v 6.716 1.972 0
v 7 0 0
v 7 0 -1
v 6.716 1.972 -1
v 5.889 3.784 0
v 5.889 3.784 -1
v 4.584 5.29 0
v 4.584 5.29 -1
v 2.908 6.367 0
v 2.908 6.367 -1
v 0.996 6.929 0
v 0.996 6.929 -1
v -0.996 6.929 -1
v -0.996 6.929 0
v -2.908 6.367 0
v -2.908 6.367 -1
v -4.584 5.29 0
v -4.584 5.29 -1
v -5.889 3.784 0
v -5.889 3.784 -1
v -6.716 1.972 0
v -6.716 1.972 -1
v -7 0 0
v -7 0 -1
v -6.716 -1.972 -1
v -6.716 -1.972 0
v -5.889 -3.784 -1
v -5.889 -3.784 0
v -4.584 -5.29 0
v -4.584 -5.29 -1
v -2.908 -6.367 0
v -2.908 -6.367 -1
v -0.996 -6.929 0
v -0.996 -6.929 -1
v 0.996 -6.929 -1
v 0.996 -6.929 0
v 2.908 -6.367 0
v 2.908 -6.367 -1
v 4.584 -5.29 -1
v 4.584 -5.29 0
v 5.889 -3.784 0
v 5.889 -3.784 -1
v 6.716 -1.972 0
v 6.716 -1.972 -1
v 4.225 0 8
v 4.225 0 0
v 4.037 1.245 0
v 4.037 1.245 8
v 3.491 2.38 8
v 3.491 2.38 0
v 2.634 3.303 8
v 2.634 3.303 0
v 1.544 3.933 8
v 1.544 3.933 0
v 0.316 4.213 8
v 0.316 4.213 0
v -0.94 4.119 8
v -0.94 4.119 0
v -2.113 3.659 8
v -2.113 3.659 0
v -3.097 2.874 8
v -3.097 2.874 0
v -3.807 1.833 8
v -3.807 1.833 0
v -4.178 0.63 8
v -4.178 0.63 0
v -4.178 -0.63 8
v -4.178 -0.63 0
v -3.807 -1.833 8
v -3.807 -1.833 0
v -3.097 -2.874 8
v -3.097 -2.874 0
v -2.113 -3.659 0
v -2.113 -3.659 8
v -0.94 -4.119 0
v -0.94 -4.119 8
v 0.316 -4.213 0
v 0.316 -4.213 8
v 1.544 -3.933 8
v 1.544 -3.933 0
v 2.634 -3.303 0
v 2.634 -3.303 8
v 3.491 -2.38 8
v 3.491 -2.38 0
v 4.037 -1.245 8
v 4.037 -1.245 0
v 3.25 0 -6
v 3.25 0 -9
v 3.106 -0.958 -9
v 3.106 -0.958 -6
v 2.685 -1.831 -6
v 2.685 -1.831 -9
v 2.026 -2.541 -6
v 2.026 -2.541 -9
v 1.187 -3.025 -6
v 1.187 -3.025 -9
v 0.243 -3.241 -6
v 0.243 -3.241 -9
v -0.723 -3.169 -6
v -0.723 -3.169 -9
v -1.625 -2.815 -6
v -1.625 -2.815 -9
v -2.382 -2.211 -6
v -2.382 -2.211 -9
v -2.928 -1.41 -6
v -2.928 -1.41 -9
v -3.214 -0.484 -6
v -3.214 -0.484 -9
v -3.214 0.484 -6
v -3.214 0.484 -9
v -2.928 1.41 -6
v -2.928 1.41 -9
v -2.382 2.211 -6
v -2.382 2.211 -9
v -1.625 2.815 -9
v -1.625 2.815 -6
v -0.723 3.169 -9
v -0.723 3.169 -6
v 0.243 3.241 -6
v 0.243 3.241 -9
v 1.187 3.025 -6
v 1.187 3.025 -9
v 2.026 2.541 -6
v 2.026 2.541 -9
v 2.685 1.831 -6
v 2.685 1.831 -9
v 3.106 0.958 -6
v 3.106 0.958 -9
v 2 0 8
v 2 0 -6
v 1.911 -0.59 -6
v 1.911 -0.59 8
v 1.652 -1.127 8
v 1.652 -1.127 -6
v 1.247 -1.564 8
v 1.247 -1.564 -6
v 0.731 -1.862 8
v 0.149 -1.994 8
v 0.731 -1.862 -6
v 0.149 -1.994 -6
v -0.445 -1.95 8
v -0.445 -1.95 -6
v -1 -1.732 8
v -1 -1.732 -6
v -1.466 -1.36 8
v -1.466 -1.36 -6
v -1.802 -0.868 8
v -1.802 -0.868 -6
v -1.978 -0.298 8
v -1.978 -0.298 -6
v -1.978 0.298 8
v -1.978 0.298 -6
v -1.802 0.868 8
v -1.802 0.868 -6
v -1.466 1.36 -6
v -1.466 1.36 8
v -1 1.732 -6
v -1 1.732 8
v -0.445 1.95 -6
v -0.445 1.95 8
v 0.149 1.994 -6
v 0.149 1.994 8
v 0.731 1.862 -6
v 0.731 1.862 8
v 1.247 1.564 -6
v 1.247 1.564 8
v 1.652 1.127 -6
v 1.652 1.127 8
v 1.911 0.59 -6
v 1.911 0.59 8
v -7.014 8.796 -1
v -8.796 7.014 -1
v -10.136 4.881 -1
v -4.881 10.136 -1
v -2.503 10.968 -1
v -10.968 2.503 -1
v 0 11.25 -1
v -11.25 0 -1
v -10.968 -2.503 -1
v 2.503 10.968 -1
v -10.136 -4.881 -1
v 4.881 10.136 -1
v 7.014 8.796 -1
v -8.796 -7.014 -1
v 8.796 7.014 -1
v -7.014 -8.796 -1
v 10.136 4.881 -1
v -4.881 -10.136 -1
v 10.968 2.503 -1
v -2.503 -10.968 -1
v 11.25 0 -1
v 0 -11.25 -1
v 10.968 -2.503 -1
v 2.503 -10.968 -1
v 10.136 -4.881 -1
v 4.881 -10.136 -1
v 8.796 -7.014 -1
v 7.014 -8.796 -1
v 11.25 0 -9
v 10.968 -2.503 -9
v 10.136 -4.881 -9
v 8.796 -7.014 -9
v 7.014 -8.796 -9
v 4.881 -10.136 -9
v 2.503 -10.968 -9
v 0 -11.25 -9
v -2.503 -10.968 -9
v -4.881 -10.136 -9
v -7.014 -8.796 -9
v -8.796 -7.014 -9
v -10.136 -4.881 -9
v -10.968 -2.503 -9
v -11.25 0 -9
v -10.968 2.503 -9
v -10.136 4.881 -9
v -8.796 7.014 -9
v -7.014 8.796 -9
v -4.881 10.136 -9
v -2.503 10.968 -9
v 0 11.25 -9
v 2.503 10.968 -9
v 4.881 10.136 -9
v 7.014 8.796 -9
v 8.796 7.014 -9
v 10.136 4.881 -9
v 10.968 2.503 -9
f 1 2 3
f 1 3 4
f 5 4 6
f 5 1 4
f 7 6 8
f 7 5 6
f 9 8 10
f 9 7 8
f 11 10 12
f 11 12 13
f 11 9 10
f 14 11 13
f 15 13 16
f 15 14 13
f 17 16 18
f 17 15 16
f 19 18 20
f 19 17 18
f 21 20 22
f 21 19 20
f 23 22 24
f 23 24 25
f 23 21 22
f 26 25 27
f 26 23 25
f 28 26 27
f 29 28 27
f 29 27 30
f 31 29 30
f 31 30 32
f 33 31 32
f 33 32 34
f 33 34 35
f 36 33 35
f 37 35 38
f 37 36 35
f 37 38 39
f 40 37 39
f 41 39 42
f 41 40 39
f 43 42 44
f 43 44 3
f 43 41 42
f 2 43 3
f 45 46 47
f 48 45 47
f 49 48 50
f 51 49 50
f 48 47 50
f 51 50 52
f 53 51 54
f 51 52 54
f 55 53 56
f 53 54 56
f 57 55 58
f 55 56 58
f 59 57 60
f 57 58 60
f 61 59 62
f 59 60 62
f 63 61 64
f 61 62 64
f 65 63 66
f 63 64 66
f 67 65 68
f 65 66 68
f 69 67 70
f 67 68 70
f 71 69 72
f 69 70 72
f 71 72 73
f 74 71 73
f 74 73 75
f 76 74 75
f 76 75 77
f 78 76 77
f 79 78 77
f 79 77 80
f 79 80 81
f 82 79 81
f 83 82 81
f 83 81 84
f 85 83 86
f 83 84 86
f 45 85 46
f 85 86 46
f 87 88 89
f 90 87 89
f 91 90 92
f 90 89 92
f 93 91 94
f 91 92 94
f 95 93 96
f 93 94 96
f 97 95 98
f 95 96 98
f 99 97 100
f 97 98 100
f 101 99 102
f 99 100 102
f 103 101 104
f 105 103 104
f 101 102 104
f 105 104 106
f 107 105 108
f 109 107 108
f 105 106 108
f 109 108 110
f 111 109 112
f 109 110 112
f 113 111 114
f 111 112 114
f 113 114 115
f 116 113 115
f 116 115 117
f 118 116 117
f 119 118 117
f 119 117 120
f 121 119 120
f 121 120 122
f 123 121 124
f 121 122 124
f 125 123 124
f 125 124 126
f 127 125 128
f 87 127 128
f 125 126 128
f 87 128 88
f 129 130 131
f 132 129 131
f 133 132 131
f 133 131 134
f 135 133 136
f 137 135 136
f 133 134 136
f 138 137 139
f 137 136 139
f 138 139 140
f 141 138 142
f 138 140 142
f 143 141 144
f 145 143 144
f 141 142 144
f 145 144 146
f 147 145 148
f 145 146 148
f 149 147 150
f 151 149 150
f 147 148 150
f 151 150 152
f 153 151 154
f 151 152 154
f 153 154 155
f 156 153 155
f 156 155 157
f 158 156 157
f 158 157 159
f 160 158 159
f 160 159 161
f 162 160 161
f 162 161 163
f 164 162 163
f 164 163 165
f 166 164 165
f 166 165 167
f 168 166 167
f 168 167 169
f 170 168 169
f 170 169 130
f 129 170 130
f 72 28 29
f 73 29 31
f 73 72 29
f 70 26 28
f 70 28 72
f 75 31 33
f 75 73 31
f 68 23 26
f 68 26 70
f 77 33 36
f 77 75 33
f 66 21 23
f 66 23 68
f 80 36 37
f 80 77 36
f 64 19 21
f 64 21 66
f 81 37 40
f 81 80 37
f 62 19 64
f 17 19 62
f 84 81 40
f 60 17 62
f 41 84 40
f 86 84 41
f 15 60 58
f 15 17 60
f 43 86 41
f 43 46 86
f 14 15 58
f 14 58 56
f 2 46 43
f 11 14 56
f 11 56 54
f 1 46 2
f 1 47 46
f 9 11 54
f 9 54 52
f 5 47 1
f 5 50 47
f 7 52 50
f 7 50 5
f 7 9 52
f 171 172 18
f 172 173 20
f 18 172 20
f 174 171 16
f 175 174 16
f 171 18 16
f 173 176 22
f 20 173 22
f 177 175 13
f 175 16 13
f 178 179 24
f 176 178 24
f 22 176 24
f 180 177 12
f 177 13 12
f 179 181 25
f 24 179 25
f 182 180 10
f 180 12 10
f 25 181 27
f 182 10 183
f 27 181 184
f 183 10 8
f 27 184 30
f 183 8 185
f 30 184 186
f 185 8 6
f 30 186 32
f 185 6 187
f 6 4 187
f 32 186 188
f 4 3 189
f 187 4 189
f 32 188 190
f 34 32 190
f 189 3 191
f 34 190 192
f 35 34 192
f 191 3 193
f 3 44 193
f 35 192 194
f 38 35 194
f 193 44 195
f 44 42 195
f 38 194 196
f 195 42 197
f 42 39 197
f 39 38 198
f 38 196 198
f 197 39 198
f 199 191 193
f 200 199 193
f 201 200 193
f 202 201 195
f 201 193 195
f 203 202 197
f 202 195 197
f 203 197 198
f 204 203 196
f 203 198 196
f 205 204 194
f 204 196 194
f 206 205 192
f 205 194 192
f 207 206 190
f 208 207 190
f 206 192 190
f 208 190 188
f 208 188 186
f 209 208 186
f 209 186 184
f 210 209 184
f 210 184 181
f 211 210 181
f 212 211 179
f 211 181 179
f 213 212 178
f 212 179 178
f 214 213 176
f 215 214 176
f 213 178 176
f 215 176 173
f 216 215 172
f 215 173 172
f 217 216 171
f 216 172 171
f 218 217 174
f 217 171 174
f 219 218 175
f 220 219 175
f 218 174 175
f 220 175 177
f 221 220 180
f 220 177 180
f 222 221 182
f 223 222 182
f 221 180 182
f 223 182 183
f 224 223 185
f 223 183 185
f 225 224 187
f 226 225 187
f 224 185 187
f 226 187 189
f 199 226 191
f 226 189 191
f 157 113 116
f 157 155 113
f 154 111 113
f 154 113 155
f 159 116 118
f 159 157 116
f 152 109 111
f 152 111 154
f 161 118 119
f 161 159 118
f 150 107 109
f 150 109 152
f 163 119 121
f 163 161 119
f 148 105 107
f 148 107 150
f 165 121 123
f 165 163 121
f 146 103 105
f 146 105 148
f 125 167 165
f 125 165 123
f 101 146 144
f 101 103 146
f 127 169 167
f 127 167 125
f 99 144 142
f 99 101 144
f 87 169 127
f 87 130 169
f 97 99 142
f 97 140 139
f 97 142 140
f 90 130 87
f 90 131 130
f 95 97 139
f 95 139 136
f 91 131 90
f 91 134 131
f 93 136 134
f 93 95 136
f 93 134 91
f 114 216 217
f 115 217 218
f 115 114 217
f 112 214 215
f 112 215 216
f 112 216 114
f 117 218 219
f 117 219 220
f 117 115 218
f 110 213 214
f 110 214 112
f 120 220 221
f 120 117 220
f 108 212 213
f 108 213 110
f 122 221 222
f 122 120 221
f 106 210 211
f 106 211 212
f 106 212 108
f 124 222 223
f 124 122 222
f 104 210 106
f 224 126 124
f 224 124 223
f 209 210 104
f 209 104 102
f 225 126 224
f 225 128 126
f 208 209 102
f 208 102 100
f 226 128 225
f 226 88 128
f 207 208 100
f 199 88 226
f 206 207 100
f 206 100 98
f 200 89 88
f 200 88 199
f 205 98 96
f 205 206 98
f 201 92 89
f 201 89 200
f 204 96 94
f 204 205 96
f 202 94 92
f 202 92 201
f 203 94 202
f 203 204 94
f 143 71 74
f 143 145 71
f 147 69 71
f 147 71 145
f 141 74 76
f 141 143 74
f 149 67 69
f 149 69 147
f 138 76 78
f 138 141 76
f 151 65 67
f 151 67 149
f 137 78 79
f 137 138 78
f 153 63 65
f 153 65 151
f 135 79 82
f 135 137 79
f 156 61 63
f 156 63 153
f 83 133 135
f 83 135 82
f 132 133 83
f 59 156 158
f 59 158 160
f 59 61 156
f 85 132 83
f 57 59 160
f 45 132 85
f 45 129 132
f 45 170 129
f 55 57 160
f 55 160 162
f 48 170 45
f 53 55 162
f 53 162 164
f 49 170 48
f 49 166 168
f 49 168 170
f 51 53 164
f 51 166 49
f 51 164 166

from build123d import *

# Parameters (mm, degrees)
SKETCH_R        = 4.225
PAD_DEPTH       = 8
SKETCH001_R     = 7
PAD001_DEPTH    = 1
SKETCH002_R     = 11.25
PAD002_DEPTH    = 8
SKETCH003_R     = 2
POCKET_DEPTH    = 17.001
SKETCH004_R     = 3.25
POCKET001_DEPTH = 3


with BuildPart() as part:
    # Sketch → Pad (new body)
    with BuildSketch(Plane.XY):
        Circle(SKETCH_R)
    extrude(amount=PAD_DEPTH)

    # Sketch001 → Pad001 (join)
    with BuildSketch(Plane.XY):
        Circle(SKETCH001_R)
    extrude(amount=-PAD001_DEPTH)

    # Sketch002 (on Face3 of Pad001) → Pad002 (join)
    with BuildSketch(Plane(origin=(0, 0, -1), x_dir=(1, 0, 0), z_dir=(0, 0, -1))):
        Circle(SKETCH002_R)
    extrude(amount=PAD002_DEPTH)

    # Sketch003 (on Face3 of Pad002) → Pocket (cut, through all)
    with BuildSketch(Plane(origin=(0, 0, -9), x_dir=(1, 0, 0), z_dir=(0, 0, -1))):
        Circle(SKETCH003_R)
    extrude(amount=-POCKET_DEPTH, mode=Mode.SUBTRACT)

    # Sketch004 (on Face3 of Pocket) → Pocket001 (cut)
    with BuildSketch(Plane(origin=(0, 0, -9), x_dir=(1, 0, 0), z_dir=(0, 0, -1))):
        Circle(SKETCH004_R)
    extrude(amount=-POCKET001_DEPTH, mode=Mode.SUBTRACT)


solid = part.part
